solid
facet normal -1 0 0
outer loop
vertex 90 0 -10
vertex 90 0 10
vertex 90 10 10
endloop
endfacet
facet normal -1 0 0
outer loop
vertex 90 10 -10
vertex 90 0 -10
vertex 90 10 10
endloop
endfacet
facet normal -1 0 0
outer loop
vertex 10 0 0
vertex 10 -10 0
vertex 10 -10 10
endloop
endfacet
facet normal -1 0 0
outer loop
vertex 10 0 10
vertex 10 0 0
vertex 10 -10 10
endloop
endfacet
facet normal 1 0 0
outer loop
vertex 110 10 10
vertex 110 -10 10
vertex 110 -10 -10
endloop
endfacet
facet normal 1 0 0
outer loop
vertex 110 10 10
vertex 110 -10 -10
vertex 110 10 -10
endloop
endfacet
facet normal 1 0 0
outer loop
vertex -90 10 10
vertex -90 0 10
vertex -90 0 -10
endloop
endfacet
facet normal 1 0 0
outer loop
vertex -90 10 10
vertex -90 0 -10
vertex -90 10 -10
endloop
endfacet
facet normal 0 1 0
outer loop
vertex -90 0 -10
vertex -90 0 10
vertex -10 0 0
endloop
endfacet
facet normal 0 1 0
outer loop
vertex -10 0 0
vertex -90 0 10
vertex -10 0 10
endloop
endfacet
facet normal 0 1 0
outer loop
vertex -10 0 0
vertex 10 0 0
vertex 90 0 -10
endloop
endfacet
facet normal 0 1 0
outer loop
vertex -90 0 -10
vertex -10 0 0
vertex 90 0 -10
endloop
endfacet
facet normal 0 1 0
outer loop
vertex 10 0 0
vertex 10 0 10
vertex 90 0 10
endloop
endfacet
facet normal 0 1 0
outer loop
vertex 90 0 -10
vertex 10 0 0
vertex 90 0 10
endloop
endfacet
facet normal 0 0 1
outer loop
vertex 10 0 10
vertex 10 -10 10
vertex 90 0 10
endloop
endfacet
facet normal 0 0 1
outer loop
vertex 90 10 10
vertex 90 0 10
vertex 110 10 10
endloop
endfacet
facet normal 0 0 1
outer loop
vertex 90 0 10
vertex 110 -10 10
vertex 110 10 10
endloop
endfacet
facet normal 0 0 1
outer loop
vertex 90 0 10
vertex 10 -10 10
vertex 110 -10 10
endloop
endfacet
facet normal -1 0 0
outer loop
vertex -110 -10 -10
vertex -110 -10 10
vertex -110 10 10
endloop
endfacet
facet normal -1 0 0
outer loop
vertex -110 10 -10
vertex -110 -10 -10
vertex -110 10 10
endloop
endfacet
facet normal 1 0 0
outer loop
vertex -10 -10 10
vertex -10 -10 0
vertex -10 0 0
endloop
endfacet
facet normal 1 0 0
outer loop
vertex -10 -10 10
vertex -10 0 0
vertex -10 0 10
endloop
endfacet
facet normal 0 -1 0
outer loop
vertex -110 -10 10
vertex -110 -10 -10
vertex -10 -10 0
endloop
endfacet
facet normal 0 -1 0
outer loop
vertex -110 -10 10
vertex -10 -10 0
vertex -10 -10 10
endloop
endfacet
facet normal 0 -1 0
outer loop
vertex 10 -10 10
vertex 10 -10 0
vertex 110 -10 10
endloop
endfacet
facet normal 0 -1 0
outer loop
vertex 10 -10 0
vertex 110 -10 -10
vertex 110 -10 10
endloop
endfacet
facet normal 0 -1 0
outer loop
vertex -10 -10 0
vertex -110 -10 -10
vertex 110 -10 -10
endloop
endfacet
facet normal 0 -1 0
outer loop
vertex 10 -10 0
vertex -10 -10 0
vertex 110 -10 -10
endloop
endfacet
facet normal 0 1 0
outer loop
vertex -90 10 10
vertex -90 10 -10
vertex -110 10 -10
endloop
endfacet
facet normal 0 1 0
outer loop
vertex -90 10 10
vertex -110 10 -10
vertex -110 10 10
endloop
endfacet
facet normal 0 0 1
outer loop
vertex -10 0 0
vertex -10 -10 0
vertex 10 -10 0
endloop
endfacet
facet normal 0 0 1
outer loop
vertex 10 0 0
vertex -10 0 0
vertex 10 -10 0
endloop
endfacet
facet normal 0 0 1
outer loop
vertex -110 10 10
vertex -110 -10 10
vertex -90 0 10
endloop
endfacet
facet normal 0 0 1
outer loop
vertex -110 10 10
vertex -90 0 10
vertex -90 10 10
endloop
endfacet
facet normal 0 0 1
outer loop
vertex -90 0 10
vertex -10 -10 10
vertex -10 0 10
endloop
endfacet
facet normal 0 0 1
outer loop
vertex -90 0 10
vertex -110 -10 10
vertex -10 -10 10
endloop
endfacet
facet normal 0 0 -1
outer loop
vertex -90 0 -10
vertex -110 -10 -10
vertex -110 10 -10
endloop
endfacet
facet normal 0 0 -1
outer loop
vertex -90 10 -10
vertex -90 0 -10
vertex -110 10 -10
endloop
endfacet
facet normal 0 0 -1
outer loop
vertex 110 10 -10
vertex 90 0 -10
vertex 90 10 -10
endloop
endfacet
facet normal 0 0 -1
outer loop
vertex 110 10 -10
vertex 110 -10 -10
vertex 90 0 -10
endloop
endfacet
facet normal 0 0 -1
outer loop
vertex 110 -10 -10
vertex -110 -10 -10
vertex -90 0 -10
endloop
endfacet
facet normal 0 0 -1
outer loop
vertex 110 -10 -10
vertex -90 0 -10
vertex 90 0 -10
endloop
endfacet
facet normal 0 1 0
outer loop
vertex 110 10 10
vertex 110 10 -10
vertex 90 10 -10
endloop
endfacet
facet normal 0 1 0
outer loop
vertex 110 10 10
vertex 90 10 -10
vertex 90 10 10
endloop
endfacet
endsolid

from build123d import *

# Parameters (mm, degrees)
F0_W     = 20
F0_H     = 20
F1_DEPTH = 110
F2_W     = 20
F2_H     = 10
F3_DEPTH = 20
F4_W     = 180
F4_H     = 10
F5_DEPTH = 20


with BuildPart() as f1:
    # F0 (on Right) → F1 (new body, symmetric)
    with BuildSketch(Plane.YZ):
        Rectangle(F0_W, F0_H)
    extrude(amount=F1_DEPTH, both=True)

    # F2 (on face) → F3 (cut)
    with BuildSketch(Plane.XZ.offset(10)):
        with Locations((0, 5)):
            Rectangle(F2_W, F2_H)
    extrude(amount=-F3_DEPTH, mode=Mode.SUBTRACT)

    # F4 (on face) → F5 (cut)
    with BuildSketch(Plane.XY.offset(10)):
        with Locations((0, 5)):
            Rectangle(F4_W, F4_H)
    extrude(amount=-F5_DEPTH, mode=Mode.SUBTRACT)


solid = f1.part
